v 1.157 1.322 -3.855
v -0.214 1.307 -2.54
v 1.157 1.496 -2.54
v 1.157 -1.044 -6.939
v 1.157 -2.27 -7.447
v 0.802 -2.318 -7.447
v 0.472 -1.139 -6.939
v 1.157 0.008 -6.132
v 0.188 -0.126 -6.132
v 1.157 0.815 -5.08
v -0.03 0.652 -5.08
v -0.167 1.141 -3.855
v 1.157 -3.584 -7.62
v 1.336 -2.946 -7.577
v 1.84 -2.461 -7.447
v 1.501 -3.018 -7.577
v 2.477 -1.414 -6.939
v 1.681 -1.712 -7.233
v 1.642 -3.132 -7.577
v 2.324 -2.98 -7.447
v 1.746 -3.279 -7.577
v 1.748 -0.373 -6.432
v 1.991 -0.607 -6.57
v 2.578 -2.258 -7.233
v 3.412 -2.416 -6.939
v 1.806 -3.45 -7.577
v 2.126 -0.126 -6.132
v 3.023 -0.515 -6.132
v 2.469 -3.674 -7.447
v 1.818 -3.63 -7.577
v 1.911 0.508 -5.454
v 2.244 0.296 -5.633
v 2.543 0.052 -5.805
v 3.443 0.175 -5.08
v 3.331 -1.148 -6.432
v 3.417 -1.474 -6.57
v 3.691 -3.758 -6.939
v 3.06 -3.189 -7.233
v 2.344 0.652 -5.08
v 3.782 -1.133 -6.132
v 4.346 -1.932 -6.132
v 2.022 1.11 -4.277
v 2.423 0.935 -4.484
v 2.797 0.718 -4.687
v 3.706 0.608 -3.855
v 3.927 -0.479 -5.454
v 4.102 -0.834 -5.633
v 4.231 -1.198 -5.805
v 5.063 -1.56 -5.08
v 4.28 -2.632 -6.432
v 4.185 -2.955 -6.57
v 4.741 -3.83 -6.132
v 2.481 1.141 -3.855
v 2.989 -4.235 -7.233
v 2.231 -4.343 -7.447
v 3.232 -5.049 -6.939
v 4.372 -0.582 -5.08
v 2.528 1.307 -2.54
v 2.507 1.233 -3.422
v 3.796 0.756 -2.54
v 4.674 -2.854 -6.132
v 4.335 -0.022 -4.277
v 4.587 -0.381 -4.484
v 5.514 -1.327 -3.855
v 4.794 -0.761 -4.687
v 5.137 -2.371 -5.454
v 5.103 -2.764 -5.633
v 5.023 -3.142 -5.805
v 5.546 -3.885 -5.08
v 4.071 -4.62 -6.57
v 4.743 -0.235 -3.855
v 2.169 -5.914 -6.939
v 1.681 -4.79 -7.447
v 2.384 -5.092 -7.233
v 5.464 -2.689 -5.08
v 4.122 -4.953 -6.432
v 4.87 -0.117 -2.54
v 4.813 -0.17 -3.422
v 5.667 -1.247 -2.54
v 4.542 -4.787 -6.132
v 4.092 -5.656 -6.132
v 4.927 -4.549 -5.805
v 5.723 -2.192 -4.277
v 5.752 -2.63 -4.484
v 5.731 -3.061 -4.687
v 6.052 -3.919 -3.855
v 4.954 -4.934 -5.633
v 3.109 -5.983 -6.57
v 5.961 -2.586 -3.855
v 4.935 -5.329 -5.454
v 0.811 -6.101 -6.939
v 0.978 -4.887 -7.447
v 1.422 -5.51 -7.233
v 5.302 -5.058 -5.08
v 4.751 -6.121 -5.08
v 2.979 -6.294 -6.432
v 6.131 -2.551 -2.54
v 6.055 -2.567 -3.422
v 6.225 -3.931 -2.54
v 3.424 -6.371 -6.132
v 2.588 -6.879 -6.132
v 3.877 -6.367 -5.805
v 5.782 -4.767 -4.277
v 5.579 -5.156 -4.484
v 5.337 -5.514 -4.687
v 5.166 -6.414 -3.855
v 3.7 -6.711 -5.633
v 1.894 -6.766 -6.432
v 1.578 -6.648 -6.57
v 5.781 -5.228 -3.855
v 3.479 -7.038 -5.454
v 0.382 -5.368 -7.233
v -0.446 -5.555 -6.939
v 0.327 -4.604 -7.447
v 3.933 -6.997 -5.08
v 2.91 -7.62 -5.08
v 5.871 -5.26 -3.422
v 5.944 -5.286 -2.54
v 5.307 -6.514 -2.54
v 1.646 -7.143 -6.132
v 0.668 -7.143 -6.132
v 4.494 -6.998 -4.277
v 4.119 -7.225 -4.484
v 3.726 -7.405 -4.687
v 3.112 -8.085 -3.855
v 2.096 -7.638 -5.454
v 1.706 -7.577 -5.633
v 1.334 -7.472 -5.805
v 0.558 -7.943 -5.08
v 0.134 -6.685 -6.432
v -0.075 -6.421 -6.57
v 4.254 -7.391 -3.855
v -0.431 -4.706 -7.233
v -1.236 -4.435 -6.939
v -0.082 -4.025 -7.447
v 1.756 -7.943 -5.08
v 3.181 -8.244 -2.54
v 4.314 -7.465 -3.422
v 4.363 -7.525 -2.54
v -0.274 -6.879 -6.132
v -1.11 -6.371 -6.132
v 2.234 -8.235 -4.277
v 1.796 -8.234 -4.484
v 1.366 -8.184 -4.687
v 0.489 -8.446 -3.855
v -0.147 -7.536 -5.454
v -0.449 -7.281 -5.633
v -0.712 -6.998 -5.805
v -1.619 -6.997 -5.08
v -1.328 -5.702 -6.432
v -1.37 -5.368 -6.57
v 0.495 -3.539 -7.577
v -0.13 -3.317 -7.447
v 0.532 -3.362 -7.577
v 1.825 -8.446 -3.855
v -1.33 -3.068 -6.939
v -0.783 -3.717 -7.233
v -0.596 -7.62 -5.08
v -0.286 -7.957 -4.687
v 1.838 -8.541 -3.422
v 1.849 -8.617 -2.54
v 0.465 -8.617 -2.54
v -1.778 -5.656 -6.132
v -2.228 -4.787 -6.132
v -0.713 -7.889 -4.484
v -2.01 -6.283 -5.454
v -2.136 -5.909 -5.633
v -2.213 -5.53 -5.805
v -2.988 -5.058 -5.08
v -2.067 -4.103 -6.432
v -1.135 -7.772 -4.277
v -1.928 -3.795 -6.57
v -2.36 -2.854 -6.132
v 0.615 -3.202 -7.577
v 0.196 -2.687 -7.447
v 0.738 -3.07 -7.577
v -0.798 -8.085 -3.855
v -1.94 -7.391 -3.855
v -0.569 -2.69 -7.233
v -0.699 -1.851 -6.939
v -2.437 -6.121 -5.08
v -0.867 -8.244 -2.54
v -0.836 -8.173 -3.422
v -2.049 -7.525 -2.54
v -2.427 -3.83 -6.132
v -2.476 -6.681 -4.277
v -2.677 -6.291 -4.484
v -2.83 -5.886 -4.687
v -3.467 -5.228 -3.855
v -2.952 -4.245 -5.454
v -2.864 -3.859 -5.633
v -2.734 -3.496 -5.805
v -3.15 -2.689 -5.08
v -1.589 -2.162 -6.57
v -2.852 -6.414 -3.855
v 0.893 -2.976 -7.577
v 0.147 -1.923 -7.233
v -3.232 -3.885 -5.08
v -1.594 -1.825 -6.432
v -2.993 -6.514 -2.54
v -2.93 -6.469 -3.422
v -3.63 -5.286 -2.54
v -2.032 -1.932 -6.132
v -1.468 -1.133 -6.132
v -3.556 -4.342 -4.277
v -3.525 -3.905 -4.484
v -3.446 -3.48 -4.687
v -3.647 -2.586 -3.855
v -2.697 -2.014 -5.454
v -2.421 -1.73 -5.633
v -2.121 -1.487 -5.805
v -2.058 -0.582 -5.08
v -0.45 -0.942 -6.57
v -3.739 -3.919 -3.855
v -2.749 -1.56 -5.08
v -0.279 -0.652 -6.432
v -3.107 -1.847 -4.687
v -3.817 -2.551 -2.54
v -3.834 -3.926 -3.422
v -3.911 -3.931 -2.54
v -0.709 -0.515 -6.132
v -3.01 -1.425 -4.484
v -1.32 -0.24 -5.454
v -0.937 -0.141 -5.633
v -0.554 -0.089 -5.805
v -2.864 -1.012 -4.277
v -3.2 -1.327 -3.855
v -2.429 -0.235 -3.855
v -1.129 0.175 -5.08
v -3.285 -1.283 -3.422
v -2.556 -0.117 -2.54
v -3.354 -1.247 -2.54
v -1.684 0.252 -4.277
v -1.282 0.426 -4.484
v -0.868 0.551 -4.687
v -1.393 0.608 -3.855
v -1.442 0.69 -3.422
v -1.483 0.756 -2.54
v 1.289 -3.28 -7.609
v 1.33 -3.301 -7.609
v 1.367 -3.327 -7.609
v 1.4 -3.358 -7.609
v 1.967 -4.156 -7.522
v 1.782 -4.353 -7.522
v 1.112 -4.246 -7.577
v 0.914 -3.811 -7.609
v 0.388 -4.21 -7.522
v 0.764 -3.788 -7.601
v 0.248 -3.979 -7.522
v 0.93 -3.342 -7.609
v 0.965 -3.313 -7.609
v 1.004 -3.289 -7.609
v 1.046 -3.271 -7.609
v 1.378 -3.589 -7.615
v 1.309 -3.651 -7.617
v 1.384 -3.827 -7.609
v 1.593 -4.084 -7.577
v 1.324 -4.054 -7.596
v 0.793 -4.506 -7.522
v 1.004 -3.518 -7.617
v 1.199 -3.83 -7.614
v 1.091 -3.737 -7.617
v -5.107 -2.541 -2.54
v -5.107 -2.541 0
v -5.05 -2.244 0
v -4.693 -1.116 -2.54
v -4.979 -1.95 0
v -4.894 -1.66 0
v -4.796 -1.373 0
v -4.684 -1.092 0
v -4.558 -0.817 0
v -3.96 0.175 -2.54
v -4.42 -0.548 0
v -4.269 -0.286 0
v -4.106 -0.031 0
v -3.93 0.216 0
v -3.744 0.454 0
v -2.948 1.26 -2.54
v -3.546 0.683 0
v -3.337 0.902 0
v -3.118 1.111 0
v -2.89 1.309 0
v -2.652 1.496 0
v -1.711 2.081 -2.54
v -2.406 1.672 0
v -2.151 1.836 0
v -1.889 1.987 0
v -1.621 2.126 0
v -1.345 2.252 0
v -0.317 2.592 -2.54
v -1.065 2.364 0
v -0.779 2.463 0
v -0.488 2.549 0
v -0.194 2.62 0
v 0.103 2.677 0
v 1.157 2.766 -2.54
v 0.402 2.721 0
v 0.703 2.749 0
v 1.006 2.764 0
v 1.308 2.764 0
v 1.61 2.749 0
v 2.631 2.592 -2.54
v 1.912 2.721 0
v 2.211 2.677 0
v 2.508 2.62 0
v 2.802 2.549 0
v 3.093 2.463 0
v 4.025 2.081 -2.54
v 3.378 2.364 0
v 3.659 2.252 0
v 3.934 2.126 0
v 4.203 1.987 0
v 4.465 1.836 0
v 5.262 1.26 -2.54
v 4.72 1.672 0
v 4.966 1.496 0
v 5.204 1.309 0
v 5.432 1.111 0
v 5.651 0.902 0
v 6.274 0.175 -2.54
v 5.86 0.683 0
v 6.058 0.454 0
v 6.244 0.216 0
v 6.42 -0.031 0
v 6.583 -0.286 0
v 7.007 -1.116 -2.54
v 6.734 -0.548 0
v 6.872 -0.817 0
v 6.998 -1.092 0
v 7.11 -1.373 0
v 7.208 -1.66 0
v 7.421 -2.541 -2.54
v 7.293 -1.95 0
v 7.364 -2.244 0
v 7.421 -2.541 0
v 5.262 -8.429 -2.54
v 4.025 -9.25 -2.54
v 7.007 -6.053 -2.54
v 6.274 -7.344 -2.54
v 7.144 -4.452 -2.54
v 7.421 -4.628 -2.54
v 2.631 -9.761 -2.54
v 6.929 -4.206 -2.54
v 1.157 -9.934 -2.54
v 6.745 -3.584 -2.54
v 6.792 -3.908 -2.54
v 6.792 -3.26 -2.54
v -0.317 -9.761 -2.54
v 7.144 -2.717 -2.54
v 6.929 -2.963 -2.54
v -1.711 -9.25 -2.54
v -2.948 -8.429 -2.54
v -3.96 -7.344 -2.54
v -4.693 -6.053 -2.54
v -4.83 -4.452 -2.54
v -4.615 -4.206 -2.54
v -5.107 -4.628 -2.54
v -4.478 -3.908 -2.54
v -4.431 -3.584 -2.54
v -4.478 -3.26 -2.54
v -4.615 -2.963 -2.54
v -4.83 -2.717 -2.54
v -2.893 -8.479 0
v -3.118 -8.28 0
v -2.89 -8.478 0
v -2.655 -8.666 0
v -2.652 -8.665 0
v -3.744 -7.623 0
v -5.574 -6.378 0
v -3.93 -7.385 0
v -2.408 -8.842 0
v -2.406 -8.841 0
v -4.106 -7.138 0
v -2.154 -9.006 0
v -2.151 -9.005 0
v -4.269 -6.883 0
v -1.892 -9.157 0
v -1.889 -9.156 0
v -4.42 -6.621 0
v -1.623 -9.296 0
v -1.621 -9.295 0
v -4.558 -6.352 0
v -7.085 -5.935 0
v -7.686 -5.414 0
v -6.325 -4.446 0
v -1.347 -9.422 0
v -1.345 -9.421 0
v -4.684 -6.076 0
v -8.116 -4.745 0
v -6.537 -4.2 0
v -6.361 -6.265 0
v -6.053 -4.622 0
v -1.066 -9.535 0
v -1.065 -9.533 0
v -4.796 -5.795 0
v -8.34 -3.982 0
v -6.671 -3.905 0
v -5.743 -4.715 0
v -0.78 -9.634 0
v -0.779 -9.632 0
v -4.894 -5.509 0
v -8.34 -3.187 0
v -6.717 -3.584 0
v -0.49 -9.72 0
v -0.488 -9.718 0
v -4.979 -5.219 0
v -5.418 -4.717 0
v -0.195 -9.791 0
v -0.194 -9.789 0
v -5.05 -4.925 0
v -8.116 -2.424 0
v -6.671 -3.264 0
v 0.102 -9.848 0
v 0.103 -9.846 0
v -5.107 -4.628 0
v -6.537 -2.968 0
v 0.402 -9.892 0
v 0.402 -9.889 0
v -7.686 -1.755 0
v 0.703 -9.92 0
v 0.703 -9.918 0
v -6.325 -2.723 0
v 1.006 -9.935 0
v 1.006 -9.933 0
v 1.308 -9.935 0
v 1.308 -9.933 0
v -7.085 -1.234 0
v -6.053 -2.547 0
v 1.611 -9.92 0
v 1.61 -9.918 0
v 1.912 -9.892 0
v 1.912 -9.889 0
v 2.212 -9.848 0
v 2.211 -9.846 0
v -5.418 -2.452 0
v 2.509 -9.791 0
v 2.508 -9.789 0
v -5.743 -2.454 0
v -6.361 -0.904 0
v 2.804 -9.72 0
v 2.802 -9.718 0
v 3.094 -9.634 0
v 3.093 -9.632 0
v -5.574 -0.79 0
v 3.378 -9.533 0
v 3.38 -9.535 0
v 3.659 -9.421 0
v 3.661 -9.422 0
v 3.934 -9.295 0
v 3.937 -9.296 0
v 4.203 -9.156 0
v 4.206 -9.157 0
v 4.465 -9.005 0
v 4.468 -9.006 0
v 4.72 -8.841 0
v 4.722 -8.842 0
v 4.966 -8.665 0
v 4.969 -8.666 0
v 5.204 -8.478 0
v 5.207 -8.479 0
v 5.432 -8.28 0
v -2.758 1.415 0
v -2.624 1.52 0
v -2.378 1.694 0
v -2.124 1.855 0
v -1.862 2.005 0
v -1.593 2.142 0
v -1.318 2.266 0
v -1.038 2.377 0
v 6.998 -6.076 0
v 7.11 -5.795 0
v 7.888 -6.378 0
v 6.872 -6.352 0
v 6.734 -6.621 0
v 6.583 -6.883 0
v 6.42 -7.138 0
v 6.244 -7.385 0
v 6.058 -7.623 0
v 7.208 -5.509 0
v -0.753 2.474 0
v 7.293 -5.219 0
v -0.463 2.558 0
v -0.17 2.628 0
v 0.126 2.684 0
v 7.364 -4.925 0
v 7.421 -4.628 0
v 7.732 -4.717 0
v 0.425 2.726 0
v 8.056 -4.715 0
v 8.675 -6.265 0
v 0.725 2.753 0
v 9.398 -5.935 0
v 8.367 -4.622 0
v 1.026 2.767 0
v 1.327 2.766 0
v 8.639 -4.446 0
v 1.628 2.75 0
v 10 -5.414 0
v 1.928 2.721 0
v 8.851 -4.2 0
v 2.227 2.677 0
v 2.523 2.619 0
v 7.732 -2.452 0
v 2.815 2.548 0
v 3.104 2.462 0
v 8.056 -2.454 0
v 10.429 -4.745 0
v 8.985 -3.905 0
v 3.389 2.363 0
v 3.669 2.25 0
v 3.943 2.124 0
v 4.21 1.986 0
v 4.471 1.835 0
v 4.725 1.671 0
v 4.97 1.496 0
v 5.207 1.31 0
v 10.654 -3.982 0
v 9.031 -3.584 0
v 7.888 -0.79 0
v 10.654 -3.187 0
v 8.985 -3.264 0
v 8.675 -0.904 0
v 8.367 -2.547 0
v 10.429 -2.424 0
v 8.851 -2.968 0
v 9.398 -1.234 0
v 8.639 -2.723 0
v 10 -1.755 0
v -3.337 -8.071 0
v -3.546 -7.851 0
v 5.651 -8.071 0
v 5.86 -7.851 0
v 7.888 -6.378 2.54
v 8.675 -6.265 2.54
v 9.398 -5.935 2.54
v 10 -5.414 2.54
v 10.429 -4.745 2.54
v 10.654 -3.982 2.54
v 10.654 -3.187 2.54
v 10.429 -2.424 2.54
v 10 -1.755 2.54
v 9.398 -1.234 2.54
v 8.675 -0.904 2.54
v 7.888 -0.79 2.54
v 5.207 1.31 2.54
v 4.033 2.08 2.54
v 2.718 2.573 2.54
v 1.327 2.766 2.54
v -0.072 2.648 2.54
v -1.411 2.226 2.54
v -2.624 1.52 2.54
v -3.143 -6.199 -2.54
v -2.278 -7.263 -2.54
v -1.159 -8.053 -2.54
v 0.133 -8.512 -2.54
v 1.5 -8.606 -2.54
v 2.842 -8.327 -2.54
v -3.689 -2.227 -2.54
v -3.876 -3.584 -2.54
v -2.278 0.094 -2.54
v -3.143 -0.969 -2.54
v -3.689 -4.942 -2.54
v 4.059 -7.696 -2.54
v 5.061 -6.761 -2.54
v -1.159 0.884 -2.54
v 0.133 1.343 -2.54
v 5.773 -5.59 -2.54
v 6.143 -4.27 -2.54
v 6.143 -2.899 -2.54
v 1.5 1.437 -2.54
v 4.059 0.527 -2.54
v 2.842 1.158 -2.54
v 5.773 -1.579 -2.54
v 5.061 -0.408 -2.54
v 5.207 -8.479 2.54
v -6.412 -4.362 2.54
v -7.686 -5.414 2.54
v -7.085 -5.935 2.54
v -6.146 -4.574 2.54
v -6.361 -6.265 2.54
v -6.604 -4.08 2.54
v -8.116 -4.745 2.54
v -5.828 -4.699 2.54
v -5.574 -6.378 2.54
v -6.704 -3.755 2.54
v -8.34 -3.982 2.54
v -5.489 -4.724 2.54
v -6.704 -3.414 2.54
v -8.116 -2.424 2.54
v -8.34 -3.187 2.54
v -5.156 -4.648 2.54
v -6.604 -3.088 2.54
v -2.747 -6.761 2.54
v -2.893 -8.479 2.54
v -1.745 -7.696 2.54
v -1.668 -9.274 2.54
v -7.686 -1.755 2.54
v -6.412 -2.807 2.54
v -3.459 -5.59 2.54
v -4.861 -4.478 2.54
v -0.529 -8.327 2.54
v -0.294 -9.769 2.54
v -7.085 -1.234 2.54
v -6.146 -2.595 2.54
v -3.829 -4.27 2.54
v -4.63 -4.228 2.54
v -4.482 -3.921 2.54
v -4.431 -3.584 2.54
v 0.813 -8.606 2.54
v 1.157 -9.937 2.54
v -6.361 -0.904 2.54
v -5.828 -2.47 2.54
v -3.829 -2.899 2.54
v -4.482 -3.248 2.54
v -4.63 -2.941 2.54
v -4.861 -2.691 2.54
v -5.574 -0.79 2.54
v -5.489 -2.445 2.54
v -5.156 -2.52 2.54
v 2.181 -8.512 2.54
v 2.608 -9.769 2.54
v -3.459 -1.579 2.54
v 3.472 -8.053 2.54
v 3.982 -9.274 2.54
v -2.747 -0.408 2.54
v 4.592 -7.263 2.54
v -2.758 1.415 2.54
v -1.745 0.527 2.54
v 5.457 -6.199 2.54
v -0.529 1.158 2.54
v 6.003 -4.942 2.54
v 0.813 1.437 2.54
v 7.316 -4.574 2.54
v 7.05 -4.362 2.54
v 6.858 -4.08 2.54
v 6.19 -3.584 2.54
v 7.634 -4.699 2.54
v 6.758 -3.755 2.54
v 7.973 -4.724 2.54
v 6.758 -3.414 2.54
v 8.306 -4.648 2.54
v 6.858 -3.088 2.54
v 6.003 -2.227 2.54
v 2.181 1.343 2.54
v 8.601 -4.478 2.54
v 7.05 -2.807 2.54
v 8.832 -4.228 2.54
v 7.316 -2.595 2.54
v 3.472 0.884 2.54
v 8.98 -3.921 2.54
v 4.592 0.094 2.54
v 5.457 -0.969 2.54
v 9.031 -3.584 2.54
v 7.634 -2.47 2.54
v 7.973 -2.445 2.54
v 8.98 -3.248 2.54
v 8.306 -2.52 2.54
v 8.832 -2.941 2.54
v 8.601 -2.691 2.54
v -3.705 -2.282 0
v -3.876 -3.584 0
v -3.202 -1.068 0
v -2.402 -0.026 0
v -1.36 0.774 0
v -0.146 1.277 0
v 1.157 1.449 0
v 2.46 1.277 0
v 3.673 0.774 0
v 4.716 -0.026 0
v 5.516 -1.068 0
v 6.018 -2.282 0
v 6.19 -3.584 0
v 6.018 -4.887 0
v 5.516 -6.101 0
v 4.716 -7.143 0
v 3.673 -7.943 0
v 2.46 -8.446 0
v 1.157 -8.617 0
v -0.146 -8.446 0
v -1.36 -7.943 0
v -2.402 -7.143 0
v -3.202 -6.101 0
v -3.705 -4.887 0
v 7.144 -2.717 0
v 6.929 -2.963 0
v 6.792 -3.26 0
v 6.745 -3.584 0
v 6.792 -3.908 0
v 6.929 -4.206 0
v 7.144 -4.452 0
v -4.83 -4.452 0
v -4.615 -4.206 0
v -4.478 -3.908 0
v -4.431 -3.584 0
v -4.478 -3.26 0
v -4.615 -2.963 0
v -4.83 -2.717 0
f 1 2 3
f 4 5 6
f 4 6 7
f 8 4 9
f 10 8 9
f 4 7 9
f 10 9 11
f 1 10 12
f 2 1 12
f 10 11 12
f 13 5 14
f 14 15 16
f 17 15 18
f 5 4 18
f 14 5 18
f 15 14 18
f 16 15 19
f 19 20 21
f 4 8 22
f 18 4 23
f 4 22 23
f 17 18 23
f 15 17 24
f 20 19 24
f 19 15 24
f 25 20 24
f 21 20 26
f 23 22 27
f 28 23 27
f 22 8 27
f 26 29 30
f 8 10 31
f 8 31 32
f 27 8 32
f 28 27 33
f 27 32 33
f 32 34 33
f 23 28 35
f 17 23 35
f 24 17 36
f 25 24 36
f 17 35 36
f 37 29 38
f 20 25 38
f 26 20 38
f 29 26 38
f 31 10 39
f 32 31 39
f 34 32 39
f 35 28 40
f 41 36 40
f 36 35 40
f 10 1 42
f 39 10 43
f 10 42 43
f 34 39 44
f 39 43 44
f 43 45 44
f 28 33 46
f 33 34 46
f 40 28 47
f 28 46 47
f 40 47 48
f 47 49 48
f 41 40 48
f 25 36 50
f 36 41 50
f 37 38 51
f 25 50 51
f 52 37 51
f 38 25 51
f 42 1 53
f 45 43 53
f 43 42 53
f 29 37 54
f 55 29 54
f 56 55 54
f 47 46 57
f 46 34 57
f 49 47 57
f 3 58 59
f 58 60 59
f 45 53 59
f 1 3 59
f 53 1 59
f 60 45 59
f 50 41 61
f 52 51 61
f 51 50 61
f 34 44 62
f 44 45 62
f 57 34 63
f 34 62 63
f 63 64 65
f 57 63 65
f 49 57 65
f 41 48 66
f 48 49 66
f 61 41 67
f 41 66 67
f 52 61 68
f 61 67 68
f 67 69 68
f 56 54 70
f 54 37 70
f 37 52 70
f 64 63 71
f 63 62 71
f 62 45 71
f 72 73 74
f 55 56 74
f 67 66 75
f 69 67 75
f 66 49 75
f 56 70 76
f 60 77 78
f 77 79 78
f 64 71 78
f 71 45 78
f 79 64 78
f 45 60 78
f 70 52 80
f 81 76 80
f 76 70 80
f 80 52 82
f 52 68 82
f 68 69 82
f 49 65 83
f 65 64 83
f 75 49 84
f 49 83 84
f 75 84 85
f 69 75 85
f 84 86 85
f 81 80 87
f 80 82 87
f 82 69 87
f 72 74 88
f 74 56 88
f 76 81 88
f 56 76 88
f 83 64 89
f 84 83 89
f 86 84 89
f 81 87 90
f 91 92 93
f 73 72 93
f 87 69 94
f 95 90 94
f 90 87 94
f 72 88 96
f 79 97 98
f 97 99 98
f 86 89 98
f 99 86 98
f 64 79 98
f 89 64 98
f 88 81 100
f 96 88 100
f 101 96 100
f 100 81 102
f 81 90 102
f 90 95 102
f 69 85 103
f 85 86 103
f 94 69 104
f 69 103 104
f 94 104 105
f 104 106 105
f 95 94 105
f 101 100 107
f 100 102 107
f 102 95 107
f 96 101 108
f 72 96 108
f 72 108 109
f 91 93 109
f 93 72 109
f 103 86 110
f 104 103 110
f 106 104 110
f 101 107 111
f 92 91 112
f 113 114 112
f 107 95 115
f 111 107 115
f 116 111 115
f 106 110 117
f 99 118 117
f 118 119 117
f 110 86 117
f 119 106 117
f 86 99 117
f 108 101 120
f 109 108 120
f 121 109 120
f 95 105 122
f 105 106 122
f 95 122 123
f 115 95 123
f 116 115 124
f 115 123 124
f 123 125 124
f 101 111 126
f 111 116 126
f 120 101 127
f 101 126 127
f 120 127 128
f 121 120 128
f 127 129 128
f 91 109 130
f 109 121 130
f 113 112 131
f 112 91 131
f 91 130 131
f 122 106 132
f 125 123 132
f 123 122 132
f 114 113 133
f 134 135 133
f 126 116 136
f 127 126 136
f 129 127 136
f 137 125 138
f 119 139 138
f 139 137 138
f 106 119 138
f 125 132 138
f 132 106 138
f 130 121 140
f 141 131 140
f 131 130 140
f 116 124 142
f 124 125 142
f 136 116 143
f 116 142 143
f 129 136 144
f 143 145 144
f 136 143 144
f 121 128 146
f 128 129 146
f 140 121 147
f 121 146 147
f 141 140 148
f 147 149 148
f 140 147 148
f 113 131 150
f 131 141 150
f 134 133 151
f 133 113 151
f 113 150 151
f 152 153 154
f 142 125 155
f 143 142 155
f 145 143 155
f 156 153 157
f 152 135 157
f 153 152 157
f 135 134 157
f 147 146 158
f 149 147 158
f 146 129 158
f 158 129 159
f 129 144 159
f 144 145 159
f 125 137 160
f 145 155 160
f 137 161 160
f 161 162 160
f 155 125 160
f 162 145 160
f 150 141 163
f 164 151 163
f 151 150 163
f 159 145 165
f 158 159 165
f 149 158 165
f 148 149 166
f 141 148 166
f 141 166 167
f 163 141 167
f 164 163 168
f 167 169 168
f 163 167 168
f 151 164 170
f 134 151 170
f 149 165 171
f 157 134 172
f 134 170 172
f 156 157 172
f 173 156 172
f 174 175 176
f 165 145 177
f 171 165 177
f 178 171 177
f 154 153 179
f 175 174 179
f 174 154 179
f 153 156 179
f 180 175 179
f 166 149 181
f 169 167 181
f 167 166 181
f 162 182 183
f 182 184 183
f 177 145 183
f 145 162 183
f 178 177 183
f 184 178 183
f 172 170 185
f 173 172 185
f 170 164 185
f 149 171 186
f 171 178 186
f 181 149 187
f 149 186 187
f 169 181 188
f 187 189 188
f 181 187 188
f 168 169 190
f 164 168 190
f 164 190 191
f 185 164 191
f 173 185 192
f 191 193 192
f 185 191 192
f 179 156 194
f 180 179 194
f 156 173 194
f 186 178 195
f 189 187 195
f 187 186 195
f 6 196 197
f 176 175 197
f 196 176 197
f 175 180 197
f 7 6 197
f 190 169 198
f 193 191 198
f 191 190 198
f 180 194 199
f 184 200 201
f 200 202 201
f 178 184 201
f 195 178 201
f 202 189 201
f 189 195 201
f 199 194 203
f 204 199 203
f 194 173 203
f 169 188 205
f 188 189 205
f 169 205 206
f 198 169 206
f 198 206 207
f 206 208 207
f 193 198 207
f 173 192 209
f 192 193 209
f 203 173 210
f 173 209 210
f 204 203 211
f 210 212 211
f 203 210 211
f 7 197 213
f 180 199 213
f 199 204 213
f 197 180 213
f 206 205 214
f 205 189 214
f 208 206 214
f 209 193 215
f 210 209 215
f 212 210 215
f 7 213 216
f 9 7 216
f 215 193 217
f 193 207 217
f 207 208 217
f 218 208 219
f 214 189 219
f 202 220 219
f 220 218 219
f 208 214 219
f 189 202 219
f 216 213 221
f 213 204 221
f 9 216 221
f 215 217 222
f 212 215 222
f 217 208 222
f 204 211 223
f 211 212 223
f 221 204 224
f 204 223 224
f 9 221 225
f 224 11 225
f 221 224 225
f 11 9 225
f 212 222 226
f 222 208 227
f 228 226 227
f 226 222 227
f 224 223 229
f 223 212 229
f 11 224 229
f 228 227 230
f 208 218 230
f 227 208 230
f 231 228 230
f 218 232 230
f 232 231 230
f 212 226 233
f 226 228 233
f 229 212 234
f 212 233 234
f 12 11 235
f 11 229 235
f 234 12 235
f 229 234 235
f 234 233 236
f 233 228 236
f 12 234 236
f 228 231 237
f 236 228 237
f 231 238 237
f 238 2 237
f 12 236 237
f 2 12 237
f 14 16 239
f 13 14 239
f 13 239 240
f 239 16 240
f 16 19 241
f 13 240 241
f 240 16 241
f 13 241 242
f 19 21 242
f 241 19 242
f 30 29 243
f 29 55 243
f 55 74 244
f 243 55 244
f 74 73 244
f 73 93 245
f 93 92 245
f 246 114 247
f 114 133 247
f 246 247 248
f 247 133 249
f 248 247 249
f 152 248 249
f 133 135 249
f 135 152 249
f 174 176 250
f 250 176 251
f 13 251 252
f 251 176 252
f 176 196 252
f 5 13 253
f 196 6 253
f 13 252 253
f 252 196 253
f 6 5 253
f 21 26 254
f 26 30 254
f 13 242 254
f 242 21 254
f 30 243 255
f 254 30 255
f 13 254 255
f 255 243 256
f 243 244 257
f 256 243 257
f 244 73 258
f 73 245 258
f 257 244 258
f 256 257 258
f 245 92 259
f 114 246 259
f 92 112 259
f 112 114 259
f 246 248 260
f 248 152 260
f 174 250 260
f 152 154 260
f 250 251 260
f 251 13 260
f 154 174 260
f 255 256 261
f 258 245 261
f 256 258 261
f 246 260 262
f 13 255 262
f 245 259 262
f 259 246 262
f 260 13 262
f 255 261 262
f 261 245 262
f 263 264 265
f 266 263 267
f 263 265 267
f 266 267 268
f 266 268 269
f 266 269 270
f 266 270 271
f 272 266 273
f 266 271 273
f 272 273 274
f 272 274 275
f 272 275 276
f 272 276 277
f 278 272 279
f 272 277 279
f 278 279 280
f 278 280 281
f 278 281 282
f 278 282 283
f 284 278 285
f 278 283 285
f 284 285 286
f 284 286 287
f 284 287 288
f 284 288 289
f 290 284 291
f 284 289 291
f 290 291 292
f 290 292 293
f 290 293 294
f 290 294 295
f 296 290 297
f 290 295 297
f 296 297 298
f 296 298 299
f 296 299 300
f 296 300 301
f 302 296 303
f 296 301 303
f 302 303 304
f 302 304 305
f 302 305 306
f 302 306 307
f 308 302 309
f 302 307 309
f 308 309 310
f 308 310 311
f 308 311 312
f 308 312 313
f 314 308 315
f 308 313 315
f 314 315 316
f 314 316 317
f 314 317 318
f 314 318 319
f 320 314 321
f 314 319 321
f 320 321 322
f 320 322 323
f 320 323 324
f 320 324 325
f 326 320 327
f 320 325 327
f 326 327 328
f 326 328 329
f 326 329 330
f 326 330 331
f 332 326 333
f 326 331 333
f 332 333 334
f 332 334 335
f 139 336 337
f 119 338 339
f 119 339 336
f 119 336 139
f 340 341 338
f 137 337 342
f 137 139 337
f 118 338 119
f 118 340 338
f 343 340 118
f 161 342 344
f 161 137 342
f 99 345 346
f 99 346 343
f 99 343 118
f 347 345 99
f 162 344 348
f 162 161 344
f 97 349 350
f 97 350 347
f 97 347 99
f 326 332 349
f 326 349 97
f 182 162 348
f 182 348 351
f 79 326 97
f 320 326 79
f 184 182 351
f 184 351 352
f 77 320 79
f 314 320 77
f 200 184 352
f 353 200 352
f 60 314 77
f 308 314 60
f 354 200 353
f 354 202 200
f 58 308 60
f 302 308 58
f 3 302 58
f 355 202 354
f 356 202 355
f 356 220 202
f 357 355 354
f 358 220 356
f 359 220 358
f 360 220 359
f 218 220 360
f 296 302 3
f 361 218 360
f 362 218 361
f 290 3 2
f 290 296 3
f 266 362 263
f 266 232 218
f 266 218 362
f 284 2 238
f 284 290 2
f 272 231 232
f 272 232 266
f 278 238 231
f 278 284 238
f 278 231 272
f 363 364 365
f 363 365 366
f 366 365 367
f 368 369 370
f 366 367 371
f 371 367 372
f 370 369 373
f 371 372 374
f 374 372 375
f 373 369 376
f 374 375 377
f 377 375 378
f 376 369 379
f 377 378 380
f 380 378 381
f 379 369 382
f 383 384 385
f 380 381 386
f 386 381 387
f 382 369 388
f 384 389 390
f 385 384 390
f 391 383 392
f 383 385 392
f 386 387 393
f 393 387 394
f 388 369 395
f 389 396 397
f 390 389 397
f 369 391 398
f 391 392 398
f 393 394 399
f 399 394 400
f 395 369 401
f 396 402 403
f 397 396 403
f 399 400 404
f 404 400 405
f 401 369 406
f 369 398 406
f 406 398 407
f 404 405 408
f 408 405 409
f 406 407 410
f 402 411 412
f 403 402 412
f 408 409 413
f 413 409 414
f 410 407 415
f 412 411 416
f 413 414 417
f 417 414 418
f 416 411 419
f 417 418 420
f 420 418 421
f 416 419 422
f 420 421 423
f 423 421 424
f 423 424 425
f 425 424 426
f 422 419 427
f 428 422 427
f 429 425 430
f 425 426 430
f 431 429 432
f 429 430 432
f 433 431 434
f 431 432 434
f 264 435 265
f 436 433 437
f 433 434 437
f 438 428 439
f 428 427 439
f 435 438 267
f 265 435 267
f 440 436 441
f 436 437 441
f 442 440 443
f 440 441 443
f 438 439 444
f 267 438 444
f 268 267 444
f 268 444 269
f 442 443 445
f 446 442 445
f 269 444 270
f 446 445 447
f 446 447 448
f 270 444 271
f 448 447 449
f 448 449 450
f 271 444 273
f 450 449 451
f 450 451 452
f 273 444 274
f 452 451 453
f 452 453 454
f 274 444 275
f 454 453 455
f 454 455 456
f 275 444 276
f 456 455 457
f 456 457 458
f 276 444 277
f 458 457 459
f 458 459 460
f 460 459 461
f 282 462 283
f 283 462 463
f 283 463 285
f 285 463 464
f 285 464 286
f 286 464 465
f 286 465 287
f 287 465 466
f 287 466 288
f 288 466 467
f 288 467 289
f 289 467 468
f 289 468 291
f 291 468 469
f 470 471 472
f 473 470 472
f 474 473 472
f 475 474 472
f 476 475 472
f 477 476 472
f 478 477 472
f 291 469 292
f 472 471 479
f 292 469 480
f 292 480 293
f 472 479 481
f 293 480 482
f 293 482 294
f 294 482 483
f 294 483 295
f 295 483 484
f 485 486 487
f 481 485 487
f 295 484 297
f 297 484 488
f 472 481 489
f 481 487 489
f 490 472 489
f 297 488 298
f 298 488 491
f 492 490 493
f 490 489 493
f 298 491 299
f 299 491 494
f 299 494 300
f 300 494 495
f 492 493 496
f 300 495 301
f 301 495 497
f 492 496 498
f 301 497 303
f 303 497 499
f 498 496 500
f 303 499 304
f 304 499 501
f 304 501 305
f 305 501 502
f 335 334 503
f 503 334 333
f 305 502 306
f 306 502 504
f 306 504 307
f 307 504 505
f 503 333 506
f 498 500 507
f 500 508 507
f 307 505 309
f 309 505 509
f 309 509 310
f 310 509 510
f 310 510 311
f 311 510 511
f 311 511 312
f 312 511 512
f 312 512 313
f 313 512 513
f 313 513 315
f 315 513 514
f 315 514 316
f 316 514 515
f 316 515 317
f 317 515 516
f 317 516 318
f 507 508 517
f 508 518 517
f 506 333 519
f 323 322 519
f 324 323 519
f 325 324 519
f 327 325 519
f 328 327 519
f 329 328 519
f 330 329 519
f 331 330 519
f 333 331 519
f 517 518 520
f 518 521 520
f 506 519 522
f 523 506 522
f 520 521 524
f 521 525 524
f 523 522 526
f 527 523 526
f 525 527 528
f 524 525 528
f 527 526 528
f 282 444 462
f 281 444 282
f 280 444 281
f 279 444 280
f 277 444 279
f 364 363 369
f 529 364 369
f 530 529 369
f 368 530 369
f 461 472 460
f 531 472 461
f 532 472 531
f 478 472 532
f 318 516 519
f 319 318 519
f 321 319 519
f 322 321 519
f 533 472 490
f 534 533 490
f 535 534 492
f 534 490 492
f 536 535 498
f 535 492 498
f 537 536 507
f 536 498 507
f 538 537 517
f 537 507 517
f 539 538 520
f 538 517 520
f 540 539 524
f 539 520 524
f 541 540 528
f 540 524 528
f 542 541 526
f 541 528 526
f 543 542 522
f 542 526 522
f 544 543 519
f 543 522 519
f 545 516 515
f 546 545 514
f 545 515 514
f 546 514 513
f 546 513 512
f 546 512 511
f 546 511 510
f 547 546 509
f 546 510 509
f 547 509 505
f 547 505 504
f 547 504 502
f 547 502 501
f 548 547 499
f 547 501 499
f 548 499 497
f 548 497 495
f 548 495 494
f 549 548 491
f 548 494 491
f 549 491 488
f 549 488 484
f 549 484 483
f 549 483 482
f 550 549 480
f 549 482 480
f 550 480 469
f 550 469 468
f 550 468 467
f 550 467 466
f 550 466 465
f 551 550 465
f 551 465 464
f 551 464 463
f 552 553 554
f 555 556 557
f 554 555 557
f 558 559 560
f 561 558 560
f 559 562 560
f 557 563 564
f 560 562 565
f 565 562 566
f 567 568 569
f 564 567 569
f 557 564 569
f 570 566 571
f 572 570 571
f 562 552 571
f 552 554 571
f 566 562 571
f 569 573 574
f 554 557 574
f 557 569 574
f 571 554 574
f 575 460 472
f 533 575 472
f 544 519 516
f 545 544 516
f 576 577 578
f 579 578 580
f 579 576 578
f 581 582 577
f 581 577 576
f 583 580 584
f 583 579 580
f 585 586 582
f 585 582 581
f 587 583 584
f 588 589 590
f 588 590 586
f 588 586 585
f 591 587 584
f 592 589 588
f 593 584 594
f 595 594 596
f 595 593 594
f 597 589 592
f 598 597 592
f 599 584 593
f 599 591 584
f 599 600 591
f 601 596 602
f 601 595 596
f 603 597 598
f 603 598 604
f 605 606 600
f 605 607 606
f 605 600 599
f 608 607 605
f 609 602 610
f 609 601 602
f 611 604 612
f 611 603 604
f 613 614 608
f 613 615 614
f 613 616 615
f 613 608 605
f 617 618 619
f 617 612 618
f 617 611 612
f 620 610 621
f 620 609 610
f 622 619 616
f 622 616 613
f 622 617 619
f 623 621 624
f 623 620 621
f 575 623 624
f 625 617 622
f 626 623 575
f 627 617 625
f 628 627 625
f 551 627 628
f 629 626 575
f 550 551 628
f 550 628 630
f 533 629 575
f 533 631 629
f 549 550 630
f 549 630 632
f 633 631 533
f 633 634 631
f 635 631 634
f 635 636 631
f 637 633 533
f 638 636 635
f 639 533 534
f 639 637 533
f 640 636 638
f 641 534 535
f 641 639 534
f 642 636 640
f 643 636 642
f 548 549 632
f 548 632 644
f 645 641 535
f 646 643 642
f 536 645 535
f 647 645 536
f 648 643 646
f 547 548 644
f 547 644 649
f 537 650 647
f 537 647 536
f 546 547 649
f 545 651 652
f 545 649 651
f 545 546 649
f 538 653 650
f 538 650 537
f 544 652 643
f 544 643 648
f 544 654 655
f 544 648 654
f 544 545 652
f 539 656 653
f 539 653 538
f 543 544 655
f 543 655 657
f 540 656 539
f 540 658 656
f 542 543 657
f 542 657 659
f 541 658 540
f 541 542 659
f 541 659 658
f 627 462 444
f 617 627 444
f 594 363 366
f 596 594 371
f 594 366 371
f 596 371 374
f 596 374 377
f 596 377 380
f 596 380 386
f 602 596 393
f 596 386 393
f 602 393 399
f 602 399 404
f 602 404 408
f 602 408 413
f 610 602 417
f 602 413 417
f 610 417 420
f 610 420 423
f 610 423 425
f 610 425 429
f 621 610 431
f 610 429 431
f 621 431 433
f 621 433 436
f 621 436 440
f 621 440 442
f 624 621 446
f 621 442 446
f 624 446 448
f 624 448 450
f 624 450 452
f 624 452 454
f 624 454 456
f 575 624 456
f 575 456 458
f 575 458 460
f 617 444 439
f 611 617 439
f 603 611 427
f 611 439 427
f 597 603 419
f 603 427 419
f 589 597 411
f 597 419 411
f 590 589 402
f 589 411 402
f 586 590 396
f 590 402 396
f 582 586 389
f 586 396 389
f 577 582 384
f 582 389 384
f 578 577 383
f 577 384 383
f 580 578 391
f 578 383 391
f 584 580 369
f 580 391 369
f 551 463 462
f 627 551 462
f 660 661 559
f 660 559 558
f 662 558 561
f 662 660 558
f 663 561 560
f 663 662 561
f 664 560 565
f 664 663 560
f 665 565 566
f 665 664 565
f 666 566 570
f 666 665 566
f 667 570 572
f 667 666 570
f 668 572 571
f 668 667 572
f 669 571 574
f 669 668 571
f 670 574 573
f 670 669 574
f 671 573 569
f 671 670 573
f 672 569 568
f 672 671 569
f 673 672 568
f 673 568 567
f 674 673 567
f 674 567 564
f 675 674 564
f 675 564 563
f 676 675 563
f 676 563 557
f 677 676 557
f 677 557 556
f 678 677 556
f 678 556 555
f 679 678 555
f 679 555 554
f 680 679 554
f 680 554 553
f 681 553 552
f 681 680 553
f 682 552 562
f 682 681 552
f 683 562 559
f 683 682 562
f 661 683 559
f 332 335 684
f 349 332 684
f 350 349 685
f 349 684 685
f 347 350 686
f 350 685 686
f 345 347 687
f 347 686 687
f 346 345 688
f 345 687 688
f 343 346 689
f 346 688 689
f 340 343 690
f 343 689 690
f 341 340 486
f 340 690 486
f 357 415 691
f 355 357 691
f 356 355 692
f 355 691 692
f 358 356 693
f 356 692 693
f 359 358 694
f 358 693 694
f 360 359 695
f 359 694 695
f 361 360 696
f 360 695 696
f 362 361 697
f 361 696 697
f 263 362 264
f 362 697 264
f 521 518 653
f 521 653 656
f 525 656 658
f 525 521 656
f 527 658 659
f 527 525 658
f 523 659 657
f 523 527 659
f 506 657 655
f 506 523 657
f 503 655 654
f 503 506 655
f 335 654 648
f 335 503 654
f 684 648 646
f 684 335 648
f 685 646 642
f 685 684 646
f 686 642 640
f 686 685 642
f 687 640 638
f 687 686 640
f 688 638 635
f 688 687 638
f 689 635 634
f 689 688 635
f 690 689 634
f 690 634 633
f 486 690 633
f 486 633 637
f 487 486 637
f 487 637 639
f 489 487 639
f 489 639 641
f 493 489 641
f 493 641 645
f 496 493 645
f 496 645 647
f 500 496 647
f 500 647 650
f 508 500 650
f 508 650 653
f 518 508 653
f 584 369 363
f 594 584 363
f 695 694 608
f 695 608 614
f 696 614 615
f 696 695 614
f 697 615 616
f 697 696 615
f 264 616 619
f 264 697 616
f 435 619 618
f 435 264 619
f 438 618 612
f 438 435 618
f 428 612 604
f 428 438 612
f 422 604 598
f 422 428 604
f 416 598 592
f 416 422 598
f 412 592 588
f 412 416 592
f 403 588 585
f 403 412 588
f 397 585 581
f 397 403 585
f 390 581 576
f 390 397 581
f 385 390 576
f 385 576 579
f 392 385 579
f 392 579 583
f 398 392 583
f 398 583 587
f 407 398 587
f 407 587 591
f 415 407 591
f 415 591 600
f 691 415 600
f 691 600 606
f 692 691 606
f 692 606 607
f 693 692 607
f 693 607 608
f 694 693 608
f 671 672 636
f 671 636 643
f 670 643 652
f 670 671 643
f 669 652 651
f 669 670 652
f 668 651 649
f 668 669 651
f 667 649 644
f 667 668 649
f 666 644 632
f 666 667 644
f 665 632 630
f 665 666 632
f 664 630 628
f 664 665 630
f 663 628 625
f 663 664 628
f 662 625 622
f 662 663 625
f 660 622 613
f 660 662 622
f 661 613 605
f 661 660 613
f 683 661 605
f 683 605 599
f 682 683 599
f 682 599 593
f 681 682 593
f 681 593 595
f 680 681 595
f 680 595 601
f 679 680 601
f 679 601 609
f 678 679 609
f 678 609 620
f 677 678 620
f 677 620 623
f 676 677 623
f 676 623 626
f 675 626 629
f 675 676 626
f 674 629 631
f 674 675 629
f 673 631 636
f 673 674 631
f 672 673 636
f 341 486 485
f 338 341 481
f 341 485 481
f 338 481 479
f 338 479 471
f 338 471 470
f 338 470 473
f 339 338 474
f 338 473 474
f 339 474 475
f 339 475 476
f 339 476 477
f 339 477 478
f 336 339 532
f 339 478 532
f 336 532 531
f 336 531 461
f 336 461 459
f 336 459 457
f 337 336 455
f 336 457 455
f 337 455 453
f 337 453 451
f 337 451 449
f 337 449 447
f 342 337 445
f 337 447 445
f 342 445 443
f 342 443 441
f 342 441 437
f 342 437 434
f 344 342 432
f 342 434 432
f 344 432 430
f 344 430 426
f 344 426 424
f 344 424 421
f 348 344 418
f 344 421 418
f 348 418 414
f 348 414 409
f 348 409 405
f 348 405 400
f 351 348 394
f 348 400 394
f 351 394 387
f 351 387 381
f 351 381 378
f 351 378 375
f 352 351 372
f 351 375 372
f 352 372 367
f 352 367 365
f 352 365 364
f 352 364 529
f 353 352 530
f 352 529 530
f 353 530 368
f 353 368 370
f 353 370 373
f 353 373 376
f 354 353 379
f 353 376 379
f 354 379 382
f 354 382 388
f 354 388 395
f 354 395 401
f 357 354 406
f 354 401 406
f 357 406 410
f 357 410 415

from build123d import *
from build123d.topology import SkipClean

# Parameters (mm, degrees)
SKETCH1_R           = 1.143
SKETCH1_R_2         = 5.0330227
BOSS_EXTRUDE1_DEPTH = 2.54
BOSS_EXTRUDE2_START = 2.54
SKETCH2_R           = 5.0330227
BOSS_EXTRUDE2_DEPTH = 2.54


with BuildPart() as part:
    # Sketch1 → Boss-Extrude1 (new body)
    with BuildSketch(Plane.XY):
        with BuildLine():
            ThreePointArc((-5.574053245, -0.790421797), (-8.368053245, -3.584421797), (-5.574053245, -6.378421797))
            Line((-5.574053245, -6.378421797), (-2.89267695, -8.478510283))
            ThreePointArc((-2.89267695, -8.478510283), (1.156946755, -9.936709122), (5.206570461, -8.478510283))
            Line((5.206570461, -8.478510283), (7.887946755, -6.378421797))
            ThreePointArc((7.887946755, -6.378421797), (10.681946755, -3.584421797), (7.887946755, -0.790421797))
            Line((7.887946755, -0.790421797), (5.206570461, 1.309666689))
            ThreePointArc((5.206570461, 1.309666689), (1.327399862, 2.765578203), (-2.624290324, 1.519870555))
            Line((-2.624290324, 1.519870555), (-2.758483637, 1.414768622))
            Line((-2.758483637, 1.414768622), (-5.574053245, -0.790421797))
        make_face()
        with Locations((-5.574053245, -3.584421797)):
            Circle(SKETCH1_R, mode=Mode.SUBTRACT)
        with Locations((7.887946755, -3.584421797)):
            Circle(SKETCH1_R, mode=Mode.SUBTRACT)
        with Locations((1.156946755, -3.584421797)):
            Circle(SKETCH1_R_2, mode=Mode.SUBTRACT)
    extrude(amount=BOSS_EXTRUDE1_DEPTH)

    # Sketch2 → Boss-Extrude2 (add)
    with SkipClean():  # the faces are left unmerged after this step: merging them gives an invalid solid
        with BuildSketch(Plane(origin=(0, 0, 0), x_dir=(-1, 0, 0), z_dir=(0, 0, -1)).offset(BOSS_EXTRUDE2_START)):
            with BuildLine():
                ThreePointArc((5.106789094, -2.541295144), (-1.156946755, 2.765578203), (-7.420682604, -2.541295144))
                ThreePointArc((-7.420682604, -2.541295144), (-6.744946755, -3.584421797), (-7.420682604, -4.62754845))
                ThreePointArc((-7.420682604, -4.62754845), (-1.156946755, -9.934421797), (5.106789094, -4.62754845))
                ThreePointArc((5.106789094, -4.62754845), (4.431053245, -3.584421797), (5.106789094, -2.541295144))
            make_face()
            with Locations((-1.156946755, -3.584421797)):
                Circle(SKETCH2_R, mode=Mode.SUBTRACT)
        extrude(amount=-BOSS_EXTRUDE2_DEPTH)

    # Sketch5 → Revolve1 (revolve)
    with SkipClean():  # the faces are left unmerged after this step: merging them gives an invalid solid
        with BuildSketch(Plane(origin=(1.156946755, 0, 0), x_dir=(0, 0, -1), z_dir=(1, 0, 0))):
            with BuildLine():
                Line((2.54, -3.584421797), (7.62, -3.584421797))
                ThreePointArc((7.62, -3.584421797), (6.132102448, 0.007680651), (2.54, 1.495578203))
                Line((2.54, 1.495578203), (2.54, -3.584421797))
            make_face()
        revolve(axis=Axis((1.156946755, -3.584421797, -2.54), (0, 0, -1)))


solid = part.part
